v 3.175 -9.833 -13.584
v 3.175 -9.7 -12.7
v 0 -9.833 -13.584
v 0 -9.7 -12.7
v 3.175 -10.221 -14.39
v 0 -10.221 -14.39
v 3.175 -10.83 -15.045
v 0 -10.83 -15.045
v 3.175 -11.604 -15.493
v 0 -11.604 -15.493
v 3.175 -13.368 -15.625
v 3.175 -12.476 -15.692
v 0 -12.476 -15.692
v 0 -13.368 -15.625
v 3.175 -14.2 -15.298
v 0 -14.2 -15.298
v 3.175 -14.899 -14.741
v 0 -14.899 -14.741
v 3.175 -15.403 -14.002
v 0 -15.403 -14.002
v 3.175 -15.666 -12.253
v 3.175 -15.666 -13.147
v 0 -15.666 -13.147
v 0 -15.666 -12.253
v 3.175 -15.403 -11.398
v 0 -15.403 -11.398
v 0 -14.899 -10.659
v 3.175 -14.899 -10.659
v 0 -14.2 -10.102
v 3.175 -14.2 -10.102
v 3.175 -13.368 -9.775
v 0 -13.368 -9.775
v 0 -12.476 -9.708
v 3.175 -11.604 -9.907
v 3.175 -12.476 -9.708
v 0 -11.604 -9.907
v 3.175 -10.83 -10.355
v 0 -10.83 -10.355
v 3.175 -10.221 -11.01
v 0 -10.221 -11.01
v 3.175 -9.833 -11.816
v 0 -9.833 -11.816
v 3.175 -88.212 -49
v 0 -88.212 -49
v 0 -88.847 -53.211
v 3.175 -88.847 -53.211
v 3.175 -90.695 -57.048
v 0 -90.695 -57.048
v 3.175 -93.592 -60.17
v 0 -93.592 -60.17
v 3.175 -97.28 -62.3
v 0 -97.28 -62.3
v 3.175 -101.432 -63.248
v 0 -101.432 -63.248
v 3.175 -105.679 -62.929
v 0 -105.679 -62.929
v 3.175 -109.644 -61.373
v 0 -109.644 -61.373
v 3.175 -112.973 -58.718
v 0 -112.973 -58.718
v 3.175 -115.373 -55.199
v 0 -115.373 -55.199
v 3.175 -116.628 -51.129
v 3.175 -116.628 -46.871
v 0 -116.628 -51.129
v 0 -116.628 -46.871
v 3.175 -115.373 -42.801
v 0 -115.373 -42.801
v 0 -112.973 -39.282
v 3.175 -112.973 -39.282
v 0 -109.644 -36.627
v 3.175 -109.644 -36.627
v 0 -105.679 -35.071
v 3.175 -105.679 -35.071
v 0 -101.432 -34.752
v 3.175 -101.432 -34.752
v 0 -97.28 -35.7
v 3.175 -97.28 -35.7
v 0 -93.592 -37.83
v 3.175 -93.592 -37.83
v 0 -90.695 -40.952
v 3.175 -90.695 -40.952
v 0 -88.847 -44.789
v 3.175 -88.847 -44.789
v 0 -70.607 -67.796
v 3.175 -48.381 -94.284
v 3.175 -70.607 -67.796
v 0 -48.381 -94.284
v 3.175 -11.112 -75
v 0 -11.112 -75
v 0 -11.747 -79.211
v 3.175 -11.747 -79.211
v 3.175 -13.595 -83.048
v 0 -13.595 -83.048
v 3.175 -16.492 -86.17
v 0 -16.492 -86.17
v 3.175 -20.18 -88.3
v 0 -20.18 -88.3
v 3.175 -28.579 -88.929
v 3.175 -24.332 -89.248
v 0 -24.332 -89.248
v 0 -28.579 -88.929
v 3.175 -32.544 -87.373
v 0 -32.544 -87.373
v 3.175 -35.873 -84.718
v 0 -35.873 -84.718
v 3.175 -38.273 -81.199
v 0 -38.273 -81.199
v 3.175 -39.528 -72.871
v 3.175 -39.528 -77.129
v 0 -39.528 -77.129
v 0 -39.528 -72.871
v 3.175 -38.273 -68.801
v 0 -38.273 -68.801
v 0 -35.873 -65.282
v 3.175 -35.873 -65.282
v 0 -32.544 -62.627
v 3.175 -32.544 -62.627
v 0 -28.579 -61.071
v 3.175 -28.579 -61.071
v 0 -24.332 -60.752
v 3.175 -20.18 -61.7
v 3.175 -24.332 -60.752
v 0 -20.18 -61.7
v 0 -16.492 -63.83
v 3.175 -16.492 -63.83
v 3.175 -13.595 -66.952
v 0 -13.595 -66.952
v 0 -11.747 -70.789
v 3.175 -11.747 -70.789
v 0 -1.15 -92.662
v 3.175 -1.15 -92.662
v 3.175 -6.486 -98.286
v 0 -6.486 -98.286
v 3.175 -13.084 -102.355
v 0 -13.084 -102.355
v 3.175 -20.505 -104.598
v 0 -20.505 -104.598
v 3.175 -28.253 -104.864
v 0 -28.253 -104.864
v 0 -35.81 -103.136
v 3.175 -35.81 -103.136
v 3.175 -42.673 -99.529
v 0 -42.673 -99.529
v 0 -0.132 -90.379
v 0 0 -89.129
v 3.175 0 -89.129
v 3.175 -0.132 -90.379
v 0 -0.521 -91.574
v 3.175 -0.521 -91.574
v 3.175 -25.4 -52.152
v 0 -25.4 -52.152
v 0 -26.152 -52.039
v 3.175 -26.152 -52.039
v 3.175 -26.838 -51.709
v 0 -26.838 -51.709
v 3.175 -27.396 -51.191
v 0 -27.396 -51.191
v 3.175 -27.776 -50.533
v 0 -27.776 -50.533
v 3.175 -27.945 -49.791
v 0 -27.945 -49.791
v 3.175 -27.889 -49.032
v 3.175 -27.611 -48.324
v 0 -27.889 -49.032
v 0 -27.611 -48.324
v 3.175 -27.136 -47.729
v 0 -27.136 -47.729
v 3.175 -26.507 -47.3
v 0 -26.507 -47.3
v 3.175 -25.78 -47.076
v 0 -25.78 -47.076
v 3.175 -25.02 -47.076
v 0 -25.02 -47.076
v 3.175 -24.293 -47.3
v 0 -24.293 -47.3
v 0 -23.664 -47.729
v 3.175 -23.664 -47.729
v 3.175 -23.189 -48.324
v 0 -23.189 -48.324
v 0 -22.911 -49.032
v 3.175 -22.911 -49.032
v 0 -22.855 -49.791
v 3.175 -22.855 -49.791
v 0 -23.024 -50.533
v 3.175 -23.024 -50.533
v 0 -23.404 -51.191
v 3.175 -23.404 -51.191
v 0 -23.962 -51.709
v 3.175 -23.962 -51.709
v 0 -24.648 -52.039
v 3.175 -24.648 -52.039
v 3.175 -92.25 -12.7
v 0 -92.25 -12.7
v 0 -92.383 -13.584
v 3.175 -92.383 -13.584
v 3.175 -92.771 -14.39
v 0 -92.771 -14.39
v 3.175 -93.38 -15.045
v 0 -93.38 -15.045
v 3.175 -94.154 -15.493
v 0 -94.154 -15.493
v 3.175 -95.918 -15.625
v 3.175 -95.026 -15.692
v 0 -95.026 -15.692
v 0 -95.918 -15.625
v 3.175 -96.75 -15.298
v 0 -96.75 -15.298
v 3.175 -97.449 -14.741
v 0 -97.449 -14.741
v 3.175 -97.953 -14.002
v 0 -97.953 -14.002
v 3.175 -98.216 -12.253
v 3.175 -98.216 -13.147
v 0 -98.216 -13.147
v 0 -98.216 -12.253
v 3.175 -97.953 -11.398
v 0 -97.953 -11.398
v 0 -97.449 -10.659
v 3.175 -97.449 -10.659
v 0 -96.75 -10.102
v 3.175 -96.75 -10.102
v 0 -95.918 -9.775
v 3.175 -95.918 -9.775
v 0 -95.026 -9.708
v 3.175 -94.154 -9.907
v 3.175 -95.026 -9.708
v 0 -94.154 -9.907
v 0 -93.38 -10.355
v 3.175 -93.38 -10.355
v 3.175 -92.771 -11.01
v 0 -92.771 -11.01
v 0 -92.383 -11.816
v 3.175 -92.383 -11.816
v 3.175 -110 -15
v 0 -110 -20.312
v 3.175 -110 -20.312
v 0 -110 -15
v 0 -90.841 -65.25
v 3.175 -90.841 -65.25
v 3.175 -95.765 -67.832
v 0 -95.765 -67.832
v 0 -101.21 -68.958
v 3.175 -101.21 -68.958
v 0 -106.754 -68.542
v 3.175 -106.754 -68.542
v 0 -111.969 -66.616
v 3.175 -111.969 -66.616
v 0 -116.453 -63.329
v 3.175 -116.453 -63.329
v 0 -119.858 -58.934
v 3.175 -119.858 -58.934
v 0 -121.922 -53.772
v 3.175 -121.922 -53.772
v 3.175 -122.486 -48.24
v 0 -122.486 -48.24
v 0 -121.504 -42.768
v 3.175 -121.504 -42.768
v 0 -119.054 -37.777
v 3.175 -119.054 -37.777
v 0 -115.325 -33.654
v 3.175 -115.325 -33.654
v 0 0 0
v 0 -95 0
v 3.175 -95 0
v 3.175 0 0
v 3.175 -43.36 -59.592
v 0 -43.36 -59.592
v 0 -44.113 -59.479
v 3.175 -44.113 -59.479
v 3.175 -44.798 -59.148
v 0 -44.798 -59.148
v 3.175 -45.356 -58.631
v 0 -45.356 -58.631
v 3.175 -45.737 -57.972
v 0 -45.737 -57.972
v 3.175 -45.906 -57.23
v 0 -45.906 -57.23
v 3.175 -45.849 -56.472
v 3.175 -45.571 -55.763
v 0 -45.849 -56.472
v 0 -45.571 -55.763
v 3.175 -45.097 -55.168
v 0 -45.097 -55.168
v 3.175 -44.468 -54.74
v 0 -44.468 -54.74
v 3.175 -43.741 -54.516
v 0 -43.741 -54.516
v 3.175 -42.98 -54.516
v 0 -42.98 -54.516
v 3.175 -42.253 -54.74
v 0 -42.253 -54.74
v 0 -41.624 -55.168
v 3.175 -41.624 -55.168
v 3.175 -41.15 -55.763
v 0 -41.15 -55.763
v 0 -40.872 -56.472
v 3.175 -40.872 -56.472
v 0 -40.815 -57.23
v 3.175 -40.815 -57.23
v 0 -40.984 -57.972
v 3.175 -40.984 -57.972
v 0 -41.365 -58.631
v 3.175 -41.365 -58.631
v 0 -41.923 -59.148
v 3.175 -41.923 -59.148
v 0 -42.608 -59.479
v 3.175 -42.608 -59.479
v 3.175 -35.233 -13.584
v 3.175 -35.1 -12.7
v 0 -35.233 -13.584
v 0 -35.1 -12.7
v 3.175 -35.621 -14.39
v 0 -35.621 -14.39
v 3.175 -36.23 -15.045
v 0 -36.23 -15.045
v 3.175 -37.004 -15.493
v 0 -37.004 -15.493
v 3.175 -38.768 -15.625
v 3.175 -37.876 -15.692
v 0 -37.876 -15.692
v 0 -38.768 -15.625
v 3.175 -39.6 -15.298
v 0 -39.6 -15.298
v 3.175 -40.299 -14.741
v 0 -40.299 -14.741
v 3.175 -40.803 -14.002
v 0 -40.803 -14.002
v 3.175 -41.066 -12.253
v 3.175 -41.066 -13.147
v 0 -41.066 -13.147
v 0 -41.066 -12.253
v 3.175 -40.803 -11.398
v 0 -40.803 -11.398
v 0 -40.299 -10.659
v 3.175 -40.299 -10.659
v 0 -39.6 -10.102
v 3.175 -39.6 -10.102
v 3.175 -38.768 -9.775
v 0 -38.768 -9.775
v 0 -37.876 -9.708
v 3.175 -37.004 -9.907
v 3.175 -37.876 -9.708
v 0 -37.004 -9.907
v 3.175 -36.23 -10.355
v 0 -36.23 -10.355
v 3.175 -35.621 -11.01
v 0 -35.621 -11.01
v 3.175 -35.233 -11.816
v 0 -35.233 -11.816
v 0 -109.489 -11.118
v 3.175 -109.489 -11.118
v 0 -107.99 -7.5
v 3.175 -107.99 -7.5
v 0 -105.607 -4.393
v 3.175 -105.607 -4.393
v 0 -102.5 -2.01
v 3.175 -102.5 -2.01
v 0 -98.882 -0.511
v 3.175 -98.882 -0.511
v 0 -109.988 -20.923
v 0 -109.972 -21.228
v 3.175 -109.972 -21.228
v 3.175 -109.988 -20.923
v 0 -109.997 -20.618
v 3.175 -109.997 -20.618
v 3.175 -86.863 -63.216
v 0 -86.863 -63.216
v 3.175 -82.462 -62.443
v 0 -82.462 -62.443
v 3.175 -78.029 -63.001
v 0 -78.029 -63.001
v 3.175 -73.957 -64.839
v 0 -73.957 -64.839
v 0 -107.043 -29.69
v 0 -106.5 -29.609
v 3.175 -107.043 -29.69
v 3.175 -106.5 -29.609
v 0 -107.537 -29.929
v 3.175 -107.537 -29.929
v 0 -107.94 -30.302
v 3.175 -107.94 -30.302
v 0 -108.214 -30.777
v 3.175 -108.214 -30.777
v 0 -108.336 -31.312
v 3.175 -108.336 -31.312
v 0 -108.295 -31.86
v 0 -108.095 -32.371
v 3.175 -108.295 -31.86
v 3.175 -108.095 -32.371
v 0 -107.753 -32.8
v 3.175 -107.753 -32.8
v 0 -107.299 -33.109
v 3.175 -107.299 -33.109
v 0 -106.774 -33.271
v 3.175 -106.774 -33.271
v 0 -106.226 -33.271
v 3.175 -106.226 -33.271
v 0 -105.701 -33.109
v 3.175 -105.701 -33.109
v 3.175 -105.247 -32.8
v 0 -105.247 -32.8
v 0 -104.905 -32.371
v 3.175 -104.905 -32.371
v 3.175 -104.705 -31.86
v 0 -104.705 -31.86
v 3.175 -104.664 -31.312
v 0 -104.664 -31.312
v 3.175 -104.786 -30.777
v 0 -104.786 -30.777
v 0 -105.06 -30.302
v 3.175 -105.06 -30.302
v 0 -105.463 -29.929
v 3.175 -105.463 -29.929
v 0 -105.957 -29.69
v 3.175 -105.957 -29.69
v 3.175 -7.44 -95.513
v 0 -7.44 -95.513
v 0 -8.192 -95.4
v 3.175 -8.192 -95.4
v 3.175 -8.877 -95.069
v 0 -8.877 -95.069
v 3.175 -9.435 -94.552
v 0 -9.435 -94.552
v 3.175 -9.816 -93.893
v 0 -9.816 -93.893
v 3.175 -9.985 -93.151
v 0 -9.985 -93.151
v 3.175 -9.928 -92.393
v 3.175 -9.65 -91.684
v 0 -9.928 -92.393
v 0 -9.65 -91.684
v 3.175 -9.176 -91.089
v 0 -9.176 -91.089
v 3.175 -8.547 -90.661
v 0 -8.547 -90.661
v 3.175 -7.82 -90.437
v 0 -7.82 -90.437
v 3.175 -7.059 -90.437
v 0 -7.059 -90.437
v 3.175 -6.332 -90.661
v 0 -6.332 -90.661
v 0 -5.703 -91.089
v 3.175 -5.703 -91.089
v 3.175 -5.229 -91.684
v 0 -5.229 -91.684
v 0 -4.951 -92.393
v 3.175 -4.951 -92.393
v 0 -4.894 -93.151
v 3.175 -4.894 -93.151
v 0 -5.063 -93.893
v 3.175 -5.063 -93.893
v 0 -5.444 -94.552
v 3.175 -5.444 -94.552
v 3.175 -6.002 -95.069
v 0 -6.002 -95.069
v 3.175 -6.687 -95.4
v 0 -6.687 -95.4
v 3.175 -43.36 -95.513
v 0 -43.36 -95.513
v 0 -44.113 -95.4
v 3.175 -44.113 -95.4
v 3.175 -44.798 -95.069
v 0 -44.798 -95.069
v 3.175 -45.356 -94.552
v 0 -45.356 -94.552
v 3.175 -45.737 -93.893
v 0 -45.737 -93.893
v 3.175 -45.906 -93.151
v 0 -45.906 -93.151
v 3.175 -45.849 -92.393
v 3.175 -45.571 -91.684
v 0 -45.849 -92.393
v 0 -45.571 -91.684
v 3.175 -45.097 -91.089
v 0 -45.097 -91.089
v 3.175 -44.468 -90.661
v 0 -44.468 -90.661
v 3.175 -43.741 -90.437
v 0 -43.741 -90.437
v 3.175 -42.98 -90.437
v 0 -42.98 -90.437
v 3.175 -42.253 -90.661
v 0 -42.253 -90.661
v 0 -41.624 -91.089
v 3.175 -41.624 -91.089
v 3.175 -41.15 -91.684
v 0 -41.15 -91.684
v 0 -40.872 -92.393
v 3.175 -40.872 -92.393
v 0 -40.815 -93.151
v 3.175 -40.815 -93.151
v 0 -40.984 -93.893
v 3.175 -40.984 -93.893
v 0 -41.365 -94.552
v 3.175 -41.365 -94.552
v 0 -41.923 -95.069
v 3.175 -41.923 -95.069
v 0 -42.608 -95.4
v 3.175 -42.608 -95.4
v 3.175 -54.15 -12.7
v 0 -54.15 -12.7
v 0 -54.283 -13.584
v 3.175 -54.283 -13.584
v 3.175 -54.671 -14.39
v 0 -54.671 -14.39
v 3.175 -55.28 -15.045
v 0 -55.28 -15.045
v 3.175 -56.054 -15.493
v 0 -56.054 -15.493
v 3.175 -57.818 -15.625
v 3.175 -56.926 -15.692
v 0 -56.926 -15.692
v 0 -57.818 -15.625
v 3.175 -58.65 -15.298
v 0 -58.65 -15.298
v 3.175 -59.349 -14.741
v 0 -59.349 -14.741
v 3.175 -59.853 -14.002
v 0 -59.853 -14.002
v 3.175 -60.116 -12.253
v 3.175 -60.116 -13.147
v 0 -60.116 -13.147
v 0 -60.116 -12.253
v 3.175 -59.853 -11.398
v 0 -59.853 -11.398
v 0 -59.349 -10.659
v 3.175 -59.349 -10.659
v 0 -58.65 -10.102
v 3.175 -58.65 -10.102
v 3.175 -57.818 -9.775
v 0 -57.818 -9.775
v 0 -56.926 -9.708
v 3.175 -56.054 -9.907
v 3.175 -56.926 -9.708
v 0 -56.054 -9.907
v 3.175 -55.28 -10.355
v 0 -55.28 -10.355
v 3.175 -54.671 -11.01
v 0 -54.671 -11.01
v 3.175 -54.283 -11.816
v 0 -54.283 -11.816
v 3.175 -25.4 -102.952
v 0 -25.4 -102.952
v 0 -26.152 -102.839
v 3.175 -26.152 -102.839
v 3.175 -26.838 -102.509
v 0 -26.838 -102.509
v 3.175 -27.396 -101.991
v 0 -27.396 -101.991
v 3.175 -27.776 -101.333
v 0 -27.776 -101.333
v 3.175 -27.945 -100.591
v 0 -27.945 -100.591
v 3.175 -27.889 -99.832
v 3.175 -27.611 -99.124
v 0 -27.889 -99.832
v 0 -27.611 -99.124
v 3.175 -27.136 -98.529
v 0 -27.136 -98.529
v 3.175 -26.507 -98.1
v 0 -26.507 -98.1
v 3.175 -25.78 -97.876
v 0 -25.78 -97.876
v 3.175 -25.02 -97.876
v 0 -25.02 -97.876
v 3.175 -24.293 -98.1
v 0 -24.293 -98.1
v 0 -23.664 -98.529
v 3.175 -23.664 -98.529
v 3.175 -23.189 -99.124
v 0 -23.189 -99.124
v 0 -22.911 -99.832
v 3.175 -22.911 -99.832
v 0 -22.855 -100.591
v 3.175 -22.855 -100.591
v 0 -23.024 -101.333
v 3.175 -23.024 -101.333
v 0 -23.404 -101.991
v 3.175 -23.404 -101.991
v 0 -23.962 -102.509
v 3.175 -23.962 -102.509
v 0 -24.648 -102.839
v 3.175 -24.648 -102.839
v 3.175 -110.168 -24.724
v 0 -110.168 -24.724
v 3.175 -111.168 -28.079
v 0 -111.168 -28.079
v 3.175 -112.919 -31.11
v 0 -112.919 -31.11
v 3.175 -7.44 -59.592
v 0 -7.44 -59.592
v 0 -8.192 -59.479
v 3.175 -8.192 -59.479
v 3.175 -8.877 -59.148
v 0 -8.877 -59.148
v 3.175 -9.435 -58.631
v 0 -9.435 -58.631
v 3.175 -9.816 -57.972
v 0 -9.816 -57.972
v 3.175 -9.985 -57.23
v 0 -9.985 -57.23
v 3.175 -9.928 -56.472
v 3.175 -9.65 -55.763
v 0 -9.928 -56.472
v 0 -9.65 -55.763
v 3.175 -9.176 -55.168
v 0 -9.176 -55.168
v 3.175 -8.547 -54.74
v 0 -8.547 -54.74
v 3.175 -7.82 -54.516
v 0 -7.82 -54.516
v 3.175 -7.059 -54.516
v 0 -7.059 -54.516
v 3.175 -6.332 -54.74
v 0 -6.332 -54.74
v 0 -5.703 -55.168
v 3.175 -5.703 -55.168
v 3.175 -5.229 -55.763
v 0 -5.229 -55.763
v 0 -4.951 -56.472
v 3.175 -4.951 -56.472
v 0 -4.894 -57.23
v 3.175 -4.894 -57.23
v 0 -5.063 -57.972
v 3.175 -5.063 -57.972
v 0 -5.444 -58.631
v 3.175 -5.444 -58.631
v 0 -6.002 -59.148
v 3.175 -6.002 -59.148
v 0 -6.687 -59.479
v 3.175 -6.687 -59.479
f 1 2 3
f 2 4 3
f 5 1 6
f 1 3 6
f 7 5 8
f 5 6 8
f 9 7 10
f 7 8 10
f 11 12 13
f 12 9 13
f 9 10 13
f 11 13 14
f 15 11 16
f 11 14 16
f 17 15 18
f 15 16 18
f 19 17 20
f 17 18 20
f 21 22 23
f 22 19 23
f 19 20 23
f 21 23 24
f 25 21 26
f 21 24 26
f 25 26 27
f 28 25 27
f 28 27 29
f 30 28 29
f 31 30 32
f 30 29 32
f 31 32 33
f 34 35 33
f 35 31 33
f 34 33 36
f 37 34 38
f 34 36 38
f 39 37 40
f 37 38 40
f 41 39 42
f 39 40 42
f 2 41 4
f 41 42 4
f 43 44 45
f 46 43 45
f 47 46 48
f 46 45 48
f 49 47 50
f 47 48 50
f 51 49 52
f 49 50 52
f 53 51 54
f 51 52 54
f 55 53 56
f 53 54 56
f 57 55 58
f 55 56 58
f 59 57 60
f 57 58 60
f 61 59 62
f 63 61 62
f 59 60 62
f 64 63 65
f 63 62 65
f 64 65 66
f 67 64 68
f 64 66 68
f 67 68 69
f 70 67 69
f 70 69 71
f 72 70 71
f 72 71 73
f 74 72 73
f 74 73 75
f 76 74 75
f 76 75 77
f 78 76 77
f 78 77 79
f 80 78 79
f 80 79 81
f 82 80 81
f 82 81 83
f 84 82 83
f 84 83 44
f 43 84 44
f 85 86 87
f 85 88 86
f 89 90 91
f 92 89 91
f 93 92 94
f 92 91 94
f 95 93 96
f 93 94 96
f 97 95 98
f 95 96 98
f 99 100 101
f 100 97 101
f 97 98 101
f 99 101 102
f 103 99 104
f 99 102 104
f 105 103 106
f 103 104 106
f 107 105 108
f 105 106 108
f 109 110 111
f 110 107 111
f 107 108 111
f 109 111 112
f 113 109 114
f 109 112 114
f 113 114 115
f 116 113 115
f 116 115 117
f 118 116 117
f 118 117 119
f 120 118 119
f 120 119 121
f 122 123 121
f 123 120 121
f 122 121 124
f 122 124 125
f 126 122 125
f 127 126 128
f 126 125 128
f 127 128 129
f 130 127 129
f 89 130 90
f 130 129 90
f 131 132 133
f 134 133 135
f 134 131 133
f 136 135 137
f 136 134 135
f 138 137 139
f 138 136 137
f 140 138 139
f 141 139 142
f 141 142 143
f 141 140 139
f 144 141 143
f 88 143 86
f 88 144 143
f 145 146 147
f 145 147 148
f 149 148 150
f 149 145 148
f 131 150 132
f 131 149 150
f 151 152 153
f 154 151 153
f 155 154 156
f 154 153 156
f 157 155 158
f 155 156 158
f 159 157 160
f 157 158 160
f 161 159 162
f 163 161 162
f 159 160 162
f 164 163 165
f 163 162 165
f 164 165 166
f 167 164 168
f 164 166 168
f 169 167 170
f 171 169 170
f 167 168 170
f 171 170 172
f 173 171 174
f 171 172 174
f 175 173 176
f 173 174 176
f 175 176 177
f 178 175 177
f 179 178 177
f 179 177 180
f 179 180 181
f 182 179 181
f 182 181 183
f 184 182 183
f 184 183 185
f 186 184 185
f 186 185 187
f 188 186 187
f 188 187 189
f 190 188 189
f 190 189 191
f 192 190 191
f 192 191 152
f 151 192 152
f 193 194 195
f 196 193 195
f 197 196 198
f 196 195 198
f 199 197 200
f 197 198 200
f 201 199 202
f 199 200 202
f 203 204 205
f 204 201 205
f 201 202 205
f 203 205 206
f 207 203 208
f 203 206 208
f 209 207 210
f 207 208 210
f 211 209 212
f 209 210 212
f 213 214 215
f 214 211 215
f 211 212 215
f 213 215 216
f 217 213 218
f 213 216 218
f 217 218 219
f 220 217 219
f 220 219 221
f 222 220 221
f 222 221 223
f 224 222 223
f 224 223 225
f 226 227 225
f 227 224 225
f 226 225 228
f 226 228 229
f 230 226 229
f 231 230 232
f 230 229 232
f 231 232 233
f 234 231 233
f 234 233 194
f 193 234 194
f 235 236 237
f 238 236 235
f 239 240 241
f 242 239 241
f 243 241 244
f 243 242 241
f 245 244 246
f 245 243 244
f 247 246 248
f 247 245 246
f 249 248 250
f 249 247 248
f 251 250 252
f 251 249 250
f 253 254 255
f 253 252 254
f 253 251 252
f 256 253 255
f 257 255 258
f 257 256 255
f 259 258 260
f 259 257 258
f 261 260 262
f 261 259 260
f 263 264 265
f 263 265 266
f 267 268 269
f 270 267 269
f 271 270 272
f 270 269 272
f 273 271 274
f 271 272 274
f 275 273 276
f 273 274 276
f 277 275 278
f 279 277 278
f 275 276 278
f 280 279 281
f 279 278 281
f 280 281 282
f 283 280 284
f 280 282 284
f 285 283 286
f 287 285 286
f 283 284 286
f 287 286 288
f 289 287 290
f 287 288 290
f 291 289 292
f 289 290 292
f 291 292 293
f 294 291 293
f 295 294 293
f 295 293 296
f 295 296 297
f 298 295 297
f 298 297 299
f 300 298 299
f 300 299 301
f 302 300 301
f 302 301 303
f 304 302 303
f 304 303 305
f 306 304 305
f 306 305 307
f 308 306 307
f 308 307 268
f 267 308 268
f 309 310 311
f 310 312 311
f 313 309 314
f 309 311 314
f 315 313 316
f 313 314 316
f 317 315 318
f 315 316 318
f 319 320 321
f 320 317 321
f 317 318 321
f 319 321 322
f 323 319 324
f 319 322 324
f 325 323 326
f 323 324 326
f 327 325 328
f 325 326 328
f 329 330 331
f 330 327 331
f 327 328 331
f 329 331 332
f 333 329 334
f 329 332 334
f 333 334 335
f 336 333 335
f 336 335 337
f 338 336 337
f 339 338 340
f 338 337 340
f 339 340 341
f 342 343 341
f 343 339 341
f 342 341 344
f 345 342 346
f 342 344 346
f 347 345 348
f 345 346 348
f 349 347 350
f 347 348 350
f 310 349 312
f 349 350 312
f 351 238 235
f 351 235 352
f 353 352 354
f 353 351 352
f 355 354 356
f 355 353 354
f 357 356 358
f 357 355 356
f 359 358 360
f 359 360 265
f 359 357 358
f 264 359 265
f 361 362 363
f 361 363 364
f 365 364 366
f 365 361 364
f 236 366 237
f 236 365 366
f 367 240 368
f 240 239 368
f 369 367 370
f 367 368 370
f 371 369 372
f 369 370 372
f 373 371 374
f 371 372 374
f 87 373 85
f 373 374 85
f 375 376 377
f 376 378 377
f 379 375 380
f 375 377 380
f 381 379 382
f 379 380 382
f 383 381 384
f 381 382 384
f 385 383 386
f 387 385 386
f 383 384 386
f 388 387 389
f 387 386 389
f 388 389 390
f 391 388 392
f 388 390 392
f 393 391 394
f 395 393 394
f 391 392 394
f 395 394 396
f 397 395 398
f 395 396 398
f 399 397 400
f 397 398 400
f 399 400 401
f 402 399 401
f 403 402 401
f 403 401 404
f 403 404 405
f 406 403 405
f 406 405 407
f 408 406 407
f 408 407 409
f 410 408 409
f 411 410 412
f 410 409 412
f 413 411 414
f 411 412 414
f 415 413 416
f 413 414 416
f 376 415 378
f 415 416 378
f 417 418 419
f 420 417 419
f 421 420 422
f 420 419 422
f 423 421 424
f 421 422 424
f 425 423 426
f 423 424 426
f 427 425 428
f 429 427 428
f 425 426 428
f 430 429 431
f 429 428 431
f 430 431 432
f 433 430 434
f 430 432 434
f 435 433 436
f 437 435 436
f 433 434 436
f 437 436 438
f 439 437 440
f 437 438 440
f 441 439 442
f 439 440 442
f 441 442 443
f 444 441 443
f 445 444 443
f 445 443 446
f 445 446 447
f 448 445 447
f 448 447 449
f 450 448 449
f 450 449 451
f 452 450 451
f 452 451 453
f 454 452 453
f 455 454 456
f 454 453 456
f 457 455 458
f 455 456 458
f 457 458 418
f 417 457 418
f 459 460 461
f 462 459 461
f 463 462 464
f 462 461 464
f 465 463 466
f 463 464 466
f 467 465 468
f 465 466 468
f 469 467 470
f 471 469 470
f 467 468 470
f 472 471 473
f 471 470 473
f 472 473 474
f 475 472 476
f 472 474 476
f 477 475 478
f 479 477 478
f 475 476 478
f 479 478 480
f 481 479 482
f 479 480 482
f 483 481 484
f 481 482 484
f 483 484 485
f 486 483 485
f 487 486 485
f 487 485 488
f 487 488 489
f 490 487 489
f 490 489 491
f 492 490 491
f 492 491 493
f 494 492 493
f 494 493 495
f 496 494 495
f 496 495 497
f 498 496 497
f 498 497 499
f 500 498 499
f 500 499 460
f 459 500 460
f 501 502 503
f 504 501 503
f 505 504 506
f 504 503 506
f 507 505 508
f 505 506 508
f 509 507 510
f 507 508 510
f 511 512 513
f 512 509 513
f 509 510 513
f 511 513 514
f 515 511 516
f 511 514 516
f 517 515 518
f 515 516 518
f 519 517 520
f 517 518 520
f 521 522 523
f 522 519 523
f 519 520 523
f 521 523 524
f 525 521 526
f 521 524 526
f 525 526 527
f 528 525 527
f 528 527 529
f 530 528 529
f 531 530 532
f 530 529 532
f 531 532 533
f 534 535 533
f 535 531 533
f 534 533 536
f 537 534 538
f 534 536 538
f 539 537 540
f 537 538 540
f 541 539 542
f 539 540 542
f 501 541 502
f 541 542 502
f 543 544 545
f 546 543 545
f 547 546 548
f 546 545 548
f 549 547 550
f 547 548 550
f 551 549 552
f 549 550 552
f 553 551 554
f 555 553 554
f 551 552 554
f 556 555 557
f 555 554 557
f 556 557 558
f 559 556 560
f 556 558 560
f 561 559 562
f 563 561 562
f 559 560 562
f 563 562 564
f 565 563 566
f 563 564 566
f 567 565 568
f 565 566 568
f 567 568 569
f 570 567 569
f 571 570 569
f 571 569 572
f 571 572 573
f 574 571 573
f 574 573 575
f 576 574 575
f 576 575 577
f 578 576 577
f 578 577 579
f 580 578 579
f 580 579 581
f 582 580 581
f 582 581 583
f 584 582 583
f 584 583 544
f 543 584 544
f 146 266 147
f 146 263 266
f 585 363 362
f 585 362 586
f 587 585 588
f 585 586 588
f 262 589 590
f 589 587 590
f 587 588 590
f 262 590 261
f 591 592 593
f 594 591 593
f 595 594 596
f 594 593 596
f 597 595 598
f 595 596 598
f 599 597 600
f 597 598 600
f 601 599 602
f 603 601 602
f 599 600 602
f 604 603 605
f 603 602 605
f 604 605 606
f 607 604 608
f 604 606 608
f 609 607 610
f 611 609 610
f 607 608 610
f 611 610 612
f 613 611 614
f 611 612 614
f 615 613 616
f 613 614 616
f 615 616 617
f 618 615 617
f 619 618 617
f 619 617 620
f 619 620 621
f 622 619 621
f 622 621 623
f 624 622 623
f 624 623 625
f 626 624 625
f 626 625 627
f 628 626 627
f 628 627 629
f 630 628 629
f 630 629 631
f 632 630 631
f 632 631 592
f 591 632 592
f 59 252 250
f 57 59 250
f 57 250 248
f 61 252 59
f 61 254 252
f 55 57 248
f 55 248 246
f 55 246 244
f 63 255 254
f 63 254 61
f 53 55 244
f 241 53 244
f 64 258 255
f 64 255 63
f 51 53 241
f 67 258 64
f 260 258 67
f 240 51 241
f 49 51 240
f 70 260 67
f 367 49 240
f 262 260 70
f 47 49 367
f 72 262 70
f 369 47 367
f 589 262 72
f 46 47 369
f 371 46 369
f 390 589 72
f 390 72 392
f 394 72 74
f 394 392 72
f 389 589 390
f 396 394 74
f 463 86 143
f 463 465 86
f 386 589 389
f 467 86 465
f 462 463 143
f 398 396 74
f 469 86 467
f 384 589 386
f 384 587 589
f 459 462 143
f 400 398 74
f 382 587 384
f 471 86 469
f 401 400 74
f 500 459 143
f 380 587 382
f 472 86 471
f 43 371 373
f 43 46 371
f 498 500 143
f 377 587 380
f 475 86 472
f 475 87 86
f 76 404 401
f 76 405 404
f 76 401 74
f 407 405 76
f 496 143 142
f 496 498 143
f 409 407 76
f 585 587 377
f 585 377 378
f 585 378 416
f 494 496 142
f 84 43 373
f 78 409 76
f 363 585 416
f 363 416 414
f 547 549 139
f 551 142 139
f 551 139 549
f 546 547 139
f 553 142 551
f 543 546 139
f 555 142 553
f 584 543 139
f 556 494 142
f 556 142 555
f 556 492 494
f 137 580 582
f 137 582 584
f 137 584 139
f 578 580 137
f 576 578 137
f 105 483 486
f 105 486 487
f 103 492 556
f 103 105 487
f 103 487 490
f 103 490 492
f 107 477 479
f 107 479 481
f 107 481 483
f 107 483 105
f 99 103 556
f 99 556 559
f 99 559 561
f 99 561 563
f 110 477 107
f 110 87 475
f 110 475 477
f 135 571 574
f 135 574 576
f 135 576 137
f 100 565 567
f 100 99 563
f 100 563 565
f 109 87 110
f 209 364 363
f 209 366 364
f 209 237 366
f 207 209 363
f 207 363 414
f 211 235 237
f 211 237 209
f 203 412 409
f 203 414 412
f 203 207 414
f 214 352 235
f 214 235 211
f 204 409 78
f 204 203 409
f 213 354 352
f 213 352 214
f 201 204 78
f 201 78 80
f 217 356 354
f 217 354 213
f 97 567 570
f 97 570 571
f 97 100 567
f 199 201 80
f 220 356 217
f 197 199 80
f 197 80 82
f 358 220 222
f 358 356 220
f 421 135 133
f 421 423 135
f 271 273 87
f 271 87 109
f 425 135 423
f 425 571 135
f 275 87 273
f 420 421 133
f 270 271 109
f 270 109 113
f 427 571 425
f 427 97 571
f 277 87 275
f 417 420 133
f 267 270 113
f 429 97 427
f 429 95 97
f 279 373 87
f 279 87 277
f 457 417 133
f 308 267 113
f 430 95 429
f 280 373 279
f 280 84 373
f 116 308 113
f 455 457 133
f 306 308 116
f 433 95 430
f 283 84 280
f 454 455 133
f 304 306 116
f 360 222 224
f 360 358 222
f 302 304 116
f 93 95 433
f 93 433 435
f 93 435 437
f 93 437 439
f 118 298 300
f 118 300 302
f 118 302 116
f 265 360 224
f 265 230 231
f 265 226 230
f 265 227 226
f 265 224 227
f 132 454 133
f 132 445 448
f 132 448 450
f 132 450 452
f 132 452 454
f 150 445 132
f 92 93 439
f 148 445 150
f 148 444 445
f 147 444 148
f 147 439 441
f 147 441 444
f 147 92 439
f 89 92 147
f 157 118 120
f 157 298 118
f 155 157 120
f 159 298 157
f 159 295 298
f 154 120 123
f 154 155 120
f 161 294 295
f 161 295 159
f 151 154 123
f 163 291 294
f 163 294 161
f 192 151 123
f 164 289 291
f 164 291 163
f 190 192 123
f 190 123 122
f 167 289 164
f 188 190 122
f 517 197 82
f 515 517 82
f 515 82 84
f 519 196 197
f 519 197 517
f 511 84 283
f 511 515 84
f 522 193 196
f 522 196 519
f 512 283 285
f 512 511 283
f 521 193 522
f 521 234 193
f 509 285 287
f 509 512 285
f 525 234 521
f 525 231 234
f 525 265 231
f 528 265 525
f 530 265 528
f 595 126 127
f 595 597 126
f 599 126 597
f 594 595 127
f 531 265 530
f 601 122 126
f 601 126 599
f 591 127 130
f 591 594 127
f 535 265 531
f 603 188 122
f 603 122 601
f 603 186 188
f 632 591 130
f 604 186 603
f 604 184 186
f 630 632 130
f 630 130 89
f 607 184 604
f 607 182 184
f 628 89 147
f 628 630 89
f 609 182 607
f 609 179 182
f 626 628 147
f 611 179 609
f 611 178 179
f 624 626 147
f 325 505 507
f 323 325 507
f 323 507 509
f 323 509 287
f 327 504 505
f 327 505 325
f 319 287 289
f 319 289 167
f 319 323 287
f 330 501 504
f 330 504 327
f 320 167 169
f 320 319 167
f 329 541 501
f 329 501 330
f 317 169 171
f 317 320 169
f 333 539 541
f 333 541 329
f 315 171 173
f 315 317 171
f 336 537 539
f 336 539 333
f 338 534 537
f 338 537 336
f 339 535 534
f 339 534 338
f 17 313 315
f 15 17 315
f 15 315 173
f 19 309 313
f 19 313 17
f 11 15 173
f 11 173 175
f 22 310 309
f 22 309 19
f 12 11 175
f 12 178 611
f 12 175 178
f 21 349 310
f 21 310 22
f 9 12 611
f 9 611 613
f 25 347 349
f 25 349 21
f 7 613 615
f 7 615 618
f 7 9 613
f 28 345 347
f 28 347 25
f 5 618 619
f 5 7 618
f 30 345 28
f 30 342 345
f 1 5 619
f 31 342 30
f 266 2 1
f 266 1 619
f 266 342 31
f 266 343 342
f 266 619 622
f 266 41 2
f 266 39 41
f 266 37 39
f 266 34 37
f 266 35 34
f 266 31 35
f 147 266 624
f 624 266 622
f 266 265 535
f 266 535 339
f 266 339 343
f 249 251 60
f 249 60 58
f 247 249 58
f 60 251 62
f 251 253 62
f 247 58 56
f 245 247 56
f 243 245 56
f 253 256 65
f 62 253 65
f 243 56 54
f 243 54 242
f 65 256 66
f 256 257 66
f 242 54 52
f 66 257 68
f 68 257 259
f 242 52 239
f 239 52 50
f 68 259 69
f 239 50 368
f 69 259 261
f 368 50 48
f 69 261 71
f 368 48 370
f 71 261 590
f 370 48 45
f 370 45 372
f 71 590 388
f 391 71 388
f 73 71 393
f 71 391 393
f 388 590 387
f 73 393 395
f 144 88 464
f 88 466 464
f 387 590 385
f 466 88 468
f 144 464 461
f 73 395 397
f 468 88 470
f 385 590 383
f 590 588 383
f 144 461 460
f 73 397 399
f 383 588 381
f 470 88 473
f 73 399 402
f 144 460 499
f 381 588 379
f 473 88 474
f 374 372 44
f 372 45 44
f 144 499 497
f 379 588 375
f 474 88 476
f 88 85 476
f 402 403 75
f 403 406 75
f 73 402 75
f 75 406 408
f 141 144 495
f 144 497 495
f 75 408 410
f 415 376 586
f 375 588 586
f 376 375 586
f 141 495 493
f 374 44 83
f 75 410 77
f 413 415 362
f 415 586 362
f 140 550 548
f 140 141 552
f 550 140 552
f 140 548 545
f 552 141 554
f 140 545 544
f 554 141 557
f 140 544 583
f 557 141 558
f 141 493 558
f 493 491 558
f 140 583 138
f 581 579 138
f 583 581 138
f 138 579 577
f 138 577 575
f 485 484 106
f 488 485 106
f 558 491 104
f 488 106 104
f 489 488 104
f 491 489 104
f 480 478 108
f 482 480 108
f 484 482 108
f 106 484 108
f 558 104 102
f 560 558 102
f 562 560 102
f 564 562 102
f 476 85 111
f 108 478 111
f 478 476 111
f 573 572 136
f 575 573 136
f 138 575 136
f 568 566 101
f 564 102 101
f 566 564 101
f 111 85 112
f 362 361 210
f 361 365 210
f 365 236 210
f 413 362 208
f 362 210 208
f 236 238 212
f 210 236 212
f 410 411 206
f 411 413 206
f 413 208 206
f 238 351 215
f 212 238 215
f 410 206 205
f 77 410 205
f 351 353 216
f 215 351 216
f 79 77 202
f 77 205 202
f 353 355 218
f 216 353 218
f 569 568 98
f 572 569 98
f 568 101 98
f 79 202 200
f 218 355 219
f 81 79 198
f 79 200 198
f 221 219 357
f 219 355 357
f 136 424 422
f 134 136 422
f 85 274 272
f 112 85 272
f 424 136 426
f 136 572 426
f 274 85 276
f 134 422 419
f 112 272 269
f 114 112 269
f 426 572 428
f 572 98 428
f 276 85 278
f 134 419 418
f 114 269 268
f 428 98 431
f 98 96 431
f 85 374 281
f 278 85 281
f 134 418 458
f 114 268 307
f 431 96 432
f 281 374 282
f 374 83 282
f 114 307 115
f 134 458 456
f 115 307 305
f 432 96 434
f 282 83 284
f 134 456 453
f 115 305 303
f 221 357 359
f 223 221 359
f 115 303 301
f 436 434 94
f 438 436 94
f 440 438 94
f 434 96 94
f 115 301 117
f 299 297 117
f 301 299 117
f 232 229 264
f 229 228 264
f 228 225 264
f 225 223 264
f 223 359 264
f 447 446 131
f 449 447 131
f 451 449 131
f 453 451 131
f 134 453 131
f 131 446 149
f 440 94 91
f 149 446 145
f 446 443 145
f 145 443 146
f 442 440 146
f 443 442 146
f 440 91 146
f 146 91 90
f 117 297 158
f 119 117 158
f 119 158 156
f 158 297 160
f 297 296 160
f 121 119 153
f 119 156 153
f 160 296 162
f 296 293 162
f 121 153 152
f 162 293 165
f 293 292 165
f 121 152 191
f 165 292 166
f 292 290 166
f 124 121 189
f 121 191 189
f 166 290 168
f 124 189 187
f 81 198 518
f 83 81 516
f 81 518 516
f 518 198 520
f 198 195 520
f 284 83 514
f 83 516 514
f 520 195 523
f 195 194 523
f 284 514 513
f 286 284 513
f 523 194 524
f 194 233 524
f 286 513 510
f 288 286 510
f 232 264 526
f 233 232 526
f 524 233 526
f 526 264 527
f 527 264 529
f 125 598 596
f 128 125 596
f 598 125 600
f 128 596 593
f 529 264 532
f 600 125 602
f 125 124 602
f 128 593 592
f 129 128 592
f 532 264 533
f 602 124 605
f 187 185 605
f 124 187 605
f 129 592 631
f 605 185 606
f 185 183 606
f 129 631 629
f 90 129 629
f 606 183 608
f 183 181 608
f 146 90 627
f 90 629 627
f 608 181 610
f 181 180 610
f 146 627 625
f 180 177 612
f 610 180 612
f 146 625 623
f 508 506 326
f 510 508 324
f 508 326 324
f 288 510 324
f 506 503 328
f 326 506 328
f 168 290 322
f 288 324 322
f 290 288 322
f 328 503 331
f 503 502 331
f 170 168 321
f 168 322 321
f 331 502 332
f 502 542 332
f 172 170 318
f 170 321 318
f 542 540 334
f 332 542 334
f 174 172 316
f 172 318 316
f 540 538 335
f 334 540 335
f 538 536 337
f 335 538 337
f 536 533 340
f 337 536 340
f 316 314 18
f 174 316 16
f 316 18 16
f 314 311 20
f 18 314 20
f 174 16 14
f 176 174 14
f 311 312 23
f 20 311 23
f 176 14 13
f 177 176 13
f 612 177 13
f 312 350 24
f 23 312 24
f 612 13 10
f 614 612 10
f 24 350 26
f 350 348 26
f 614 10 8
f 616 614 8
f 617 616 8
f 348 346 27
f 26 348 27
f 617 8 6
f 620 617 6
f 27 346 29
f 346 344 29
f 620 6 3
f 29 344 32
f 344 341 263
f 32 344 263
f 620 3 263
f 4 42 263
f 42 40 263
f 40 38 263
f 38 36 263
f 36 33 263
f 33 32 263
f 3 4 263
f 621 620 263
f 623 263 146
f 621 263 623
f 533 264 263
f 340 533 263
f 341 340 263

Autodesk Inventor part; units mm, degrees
ref_plane "YZ Plane" through (0, 0, 0) normal (1, 0, 0) x (0, 1, 0)
ref_plane "XZ Plane" through (0, 0, 0) normal (0, 1, 0) x (-1, 0, 0)
ref_plane "XY Plane" through (0, 0, 0) normal (0, 0, 1) x (1, 0, 0)
sketch "Sketch1" plane through (0, 0, 0) normal (1, 0, 0) x (0, 1, 0)
  line L0 (-39.3892, -105) -> (-110, -20.8494)
  line L1 (-110, -20.8494) -> (-110, 0)
  line L2 (-110, 0) -> (0, 0)
  line L3 (0, 0) -> (0, -105)
  line L4 (0, -105) -> (-39.3892, -105)
  line L5 (-110, -20.8494) -> (-119.38, 0) construction
  line L6 (-119.38, 0) -> (-110, 0) construction
  line L7 (-50.8, -25.4) -> (0, -25.4) construction
  line L8 (0, -25.4) -> (0, 0) construction
  line L9 (0, 0) -> (-50.8, 0) construction
  line L10 (-50.8, 0) -> (-50.8, -25.4) construction
  line L11 (-50.8, -25.4) -> (0, 0) construction
  line L12 (0, -25.4) -> (-50.8, 0) construction
  circle A0 centre (-12.7, -12.7) radius 3
  circle A1 centre (-38.1, -12.7) radius 3
  circle A2 centre (-102.5, -49) radius 14.2875
  circle A3 centre (-25.4, -75) radius 14.2875
  circle A4 centre (-102.5, -49) radius 20
  circle A5 centre (-25.4, -75) radius 30
  line L13 (-50.8, -90.9637) -> (-50.8, -59.0363)
  line L14 (-102.5, -49) -> (-25.4, -75) construction
  circle A6 centre (-57.15, -12.7) radius 3
  circle A7 centre (-95.25, -12.7) radius 3
  point P0 (-25.4, -12.7)
  point P1 (-25.4, -25.4)
  point P2 (-103.1519, -29.0106)
  point P3 (-82.9275, -53.1131)
  point P4 (-50.8, -75)
  point P5 (-48.3813, -94.2836)
  point P6 (0, -90.9637)
  dimension "d0" = 50
  dimension "d1" = 119.38
  dimension "d2" = 50.8
  dimension "d3" = 25.4
  dimension "d4" = 25.4
  dimension "d5" = 12.7
  dimension "d6" = 6
  dimension "d7" = 6
  dimension "d8" = 28.575
  dimension "d9" = 102.5
  dimension "d10" = 49
  dimension "d13" = 110
  dimension "d16" = 60
  dimension "d17" = 25.4
  dimension "d18" = 25.4
  dimension "d20" = 40
  dimension "d44" = 81.3659
  dimension "d45" = 38.1
  dimension "d46" = 19.05
extrude "Plate1" add sketch "Sketch1" along normal blind 3.175 contours L0 A4 L1 L2 L3 A5 | A5 L13 L3 | A4 L0 A2 | L0 A2 A4 | A5 L13
fillet "Corner Round1" radius 15 4 edges at (1.5875, -82.9275, -53.1131) (1.5875, -103.1519, -29.0106) (1.5875, -110, -20.8494) (1.5875, -110, 0)
fillet "Corner Round1" radius 6 1 edges at (1.5875, 0, -90.9637)
sketch "Sketch2" plane through (0, 0, 0) normal (-1, 0, 0) x (0, 0, 1)
  circle A0 centre (-31.4501, -106.5) radius 4.5847
  circle A1 centre (-49, -102.5) radius 14.2875 projected
  point P0 (0, 0)
  dimension "d21" = 9.1694
  dimension "d22" = 18
  dimension "d23" = 4
hole "Hole1" at (0, -106.5, -31.4501) direction (1, 0, 0) diameter 3.683 end through all thread size "10-24 UNC" class "2B" standard "ANSI Unified Screw Threads"
sketch "Sketch3" plane through (3.175, 0, 0) normal (1, 0, 0) x (0, 0, -1)
  circle A0 centre (75, -25.4) radius 14.2875 projected
  circle A1 centre (75, -25.4) radius 25.4
  line L0 (49.6, -25.4) -> (100.4, -25.4)
  line L1 (92.9605, -7.4395) -> (57.0395, -7.4395)
  line L2 (75, -25.4) -> (57.0395, -7.4395)
  line L3 (92.9605, -43.3605) -> (57.0395, -43.3605)
  line L4 (75, -25.4) -> (92.9605, -43.3605)
  line L5 (25.4, -50.8) -> (0, -50.8)
  line L6 (0, -50.8) -> (0, 0)
  line L7 (0, 0) -> (25.4, 0)
  line L8 (25.4, 0) -> (25.4, -50.8)
  line L9 (25.4, -50.8) -> (0, 0) construction
  line L10 (0, -50.8) -> (25.4, 0) construction
  point P0 (12.7, -25.4)
  dimension "d31" = 50.8
  dimension "d32" = 45
  dimension "d40" = 25.4
  dimension "d41" = 50.8
hole "Hole2" at (3.175, -7.4395, -57.0395) at (3.175, -25.4, -49.6) at (3.175, -43.3605, -57.0395) at (3.175, -43.3605, -92.9605) at (3.175, -25.4, -100.4) at (3.175, -7.4395, -92.9605) direction (-1, 0, 0) diameter 5.105 end through all clearance for "Flat Head Machine Screw (82)" size "#10" standard "Ansi Unified Screw Threads"
equation "\"d5\" = 0.5 * d4"
equation "\"d7\" = d6"
equation "\"d29\" = Thickness"
equation "\"d14\" = Thickness"
equation "\"d18\" = d17"
equation "\"BendRadius\" = Thickness"
equation "\"BendReliefWidth\" = Thickness"
equation "\"BendReliefDepth\" = 0.5 * Thickness"
equation "\"CornerReliefSize\" = 4 * Thickness"
equation "\"MinimumRemnant\" = 2 * Thickness"
equation "\"TransitionRadius\" = BendRadius"
equation "\"JacobiRadiusSize\" = BendRadius"
equation "\"GapSize\" = Thickness"
equation "\"Thickness\" = 3.175"
properties part number "INSIDE_INTAKE_PLATE" material "Aluminum, 6061-T6"
